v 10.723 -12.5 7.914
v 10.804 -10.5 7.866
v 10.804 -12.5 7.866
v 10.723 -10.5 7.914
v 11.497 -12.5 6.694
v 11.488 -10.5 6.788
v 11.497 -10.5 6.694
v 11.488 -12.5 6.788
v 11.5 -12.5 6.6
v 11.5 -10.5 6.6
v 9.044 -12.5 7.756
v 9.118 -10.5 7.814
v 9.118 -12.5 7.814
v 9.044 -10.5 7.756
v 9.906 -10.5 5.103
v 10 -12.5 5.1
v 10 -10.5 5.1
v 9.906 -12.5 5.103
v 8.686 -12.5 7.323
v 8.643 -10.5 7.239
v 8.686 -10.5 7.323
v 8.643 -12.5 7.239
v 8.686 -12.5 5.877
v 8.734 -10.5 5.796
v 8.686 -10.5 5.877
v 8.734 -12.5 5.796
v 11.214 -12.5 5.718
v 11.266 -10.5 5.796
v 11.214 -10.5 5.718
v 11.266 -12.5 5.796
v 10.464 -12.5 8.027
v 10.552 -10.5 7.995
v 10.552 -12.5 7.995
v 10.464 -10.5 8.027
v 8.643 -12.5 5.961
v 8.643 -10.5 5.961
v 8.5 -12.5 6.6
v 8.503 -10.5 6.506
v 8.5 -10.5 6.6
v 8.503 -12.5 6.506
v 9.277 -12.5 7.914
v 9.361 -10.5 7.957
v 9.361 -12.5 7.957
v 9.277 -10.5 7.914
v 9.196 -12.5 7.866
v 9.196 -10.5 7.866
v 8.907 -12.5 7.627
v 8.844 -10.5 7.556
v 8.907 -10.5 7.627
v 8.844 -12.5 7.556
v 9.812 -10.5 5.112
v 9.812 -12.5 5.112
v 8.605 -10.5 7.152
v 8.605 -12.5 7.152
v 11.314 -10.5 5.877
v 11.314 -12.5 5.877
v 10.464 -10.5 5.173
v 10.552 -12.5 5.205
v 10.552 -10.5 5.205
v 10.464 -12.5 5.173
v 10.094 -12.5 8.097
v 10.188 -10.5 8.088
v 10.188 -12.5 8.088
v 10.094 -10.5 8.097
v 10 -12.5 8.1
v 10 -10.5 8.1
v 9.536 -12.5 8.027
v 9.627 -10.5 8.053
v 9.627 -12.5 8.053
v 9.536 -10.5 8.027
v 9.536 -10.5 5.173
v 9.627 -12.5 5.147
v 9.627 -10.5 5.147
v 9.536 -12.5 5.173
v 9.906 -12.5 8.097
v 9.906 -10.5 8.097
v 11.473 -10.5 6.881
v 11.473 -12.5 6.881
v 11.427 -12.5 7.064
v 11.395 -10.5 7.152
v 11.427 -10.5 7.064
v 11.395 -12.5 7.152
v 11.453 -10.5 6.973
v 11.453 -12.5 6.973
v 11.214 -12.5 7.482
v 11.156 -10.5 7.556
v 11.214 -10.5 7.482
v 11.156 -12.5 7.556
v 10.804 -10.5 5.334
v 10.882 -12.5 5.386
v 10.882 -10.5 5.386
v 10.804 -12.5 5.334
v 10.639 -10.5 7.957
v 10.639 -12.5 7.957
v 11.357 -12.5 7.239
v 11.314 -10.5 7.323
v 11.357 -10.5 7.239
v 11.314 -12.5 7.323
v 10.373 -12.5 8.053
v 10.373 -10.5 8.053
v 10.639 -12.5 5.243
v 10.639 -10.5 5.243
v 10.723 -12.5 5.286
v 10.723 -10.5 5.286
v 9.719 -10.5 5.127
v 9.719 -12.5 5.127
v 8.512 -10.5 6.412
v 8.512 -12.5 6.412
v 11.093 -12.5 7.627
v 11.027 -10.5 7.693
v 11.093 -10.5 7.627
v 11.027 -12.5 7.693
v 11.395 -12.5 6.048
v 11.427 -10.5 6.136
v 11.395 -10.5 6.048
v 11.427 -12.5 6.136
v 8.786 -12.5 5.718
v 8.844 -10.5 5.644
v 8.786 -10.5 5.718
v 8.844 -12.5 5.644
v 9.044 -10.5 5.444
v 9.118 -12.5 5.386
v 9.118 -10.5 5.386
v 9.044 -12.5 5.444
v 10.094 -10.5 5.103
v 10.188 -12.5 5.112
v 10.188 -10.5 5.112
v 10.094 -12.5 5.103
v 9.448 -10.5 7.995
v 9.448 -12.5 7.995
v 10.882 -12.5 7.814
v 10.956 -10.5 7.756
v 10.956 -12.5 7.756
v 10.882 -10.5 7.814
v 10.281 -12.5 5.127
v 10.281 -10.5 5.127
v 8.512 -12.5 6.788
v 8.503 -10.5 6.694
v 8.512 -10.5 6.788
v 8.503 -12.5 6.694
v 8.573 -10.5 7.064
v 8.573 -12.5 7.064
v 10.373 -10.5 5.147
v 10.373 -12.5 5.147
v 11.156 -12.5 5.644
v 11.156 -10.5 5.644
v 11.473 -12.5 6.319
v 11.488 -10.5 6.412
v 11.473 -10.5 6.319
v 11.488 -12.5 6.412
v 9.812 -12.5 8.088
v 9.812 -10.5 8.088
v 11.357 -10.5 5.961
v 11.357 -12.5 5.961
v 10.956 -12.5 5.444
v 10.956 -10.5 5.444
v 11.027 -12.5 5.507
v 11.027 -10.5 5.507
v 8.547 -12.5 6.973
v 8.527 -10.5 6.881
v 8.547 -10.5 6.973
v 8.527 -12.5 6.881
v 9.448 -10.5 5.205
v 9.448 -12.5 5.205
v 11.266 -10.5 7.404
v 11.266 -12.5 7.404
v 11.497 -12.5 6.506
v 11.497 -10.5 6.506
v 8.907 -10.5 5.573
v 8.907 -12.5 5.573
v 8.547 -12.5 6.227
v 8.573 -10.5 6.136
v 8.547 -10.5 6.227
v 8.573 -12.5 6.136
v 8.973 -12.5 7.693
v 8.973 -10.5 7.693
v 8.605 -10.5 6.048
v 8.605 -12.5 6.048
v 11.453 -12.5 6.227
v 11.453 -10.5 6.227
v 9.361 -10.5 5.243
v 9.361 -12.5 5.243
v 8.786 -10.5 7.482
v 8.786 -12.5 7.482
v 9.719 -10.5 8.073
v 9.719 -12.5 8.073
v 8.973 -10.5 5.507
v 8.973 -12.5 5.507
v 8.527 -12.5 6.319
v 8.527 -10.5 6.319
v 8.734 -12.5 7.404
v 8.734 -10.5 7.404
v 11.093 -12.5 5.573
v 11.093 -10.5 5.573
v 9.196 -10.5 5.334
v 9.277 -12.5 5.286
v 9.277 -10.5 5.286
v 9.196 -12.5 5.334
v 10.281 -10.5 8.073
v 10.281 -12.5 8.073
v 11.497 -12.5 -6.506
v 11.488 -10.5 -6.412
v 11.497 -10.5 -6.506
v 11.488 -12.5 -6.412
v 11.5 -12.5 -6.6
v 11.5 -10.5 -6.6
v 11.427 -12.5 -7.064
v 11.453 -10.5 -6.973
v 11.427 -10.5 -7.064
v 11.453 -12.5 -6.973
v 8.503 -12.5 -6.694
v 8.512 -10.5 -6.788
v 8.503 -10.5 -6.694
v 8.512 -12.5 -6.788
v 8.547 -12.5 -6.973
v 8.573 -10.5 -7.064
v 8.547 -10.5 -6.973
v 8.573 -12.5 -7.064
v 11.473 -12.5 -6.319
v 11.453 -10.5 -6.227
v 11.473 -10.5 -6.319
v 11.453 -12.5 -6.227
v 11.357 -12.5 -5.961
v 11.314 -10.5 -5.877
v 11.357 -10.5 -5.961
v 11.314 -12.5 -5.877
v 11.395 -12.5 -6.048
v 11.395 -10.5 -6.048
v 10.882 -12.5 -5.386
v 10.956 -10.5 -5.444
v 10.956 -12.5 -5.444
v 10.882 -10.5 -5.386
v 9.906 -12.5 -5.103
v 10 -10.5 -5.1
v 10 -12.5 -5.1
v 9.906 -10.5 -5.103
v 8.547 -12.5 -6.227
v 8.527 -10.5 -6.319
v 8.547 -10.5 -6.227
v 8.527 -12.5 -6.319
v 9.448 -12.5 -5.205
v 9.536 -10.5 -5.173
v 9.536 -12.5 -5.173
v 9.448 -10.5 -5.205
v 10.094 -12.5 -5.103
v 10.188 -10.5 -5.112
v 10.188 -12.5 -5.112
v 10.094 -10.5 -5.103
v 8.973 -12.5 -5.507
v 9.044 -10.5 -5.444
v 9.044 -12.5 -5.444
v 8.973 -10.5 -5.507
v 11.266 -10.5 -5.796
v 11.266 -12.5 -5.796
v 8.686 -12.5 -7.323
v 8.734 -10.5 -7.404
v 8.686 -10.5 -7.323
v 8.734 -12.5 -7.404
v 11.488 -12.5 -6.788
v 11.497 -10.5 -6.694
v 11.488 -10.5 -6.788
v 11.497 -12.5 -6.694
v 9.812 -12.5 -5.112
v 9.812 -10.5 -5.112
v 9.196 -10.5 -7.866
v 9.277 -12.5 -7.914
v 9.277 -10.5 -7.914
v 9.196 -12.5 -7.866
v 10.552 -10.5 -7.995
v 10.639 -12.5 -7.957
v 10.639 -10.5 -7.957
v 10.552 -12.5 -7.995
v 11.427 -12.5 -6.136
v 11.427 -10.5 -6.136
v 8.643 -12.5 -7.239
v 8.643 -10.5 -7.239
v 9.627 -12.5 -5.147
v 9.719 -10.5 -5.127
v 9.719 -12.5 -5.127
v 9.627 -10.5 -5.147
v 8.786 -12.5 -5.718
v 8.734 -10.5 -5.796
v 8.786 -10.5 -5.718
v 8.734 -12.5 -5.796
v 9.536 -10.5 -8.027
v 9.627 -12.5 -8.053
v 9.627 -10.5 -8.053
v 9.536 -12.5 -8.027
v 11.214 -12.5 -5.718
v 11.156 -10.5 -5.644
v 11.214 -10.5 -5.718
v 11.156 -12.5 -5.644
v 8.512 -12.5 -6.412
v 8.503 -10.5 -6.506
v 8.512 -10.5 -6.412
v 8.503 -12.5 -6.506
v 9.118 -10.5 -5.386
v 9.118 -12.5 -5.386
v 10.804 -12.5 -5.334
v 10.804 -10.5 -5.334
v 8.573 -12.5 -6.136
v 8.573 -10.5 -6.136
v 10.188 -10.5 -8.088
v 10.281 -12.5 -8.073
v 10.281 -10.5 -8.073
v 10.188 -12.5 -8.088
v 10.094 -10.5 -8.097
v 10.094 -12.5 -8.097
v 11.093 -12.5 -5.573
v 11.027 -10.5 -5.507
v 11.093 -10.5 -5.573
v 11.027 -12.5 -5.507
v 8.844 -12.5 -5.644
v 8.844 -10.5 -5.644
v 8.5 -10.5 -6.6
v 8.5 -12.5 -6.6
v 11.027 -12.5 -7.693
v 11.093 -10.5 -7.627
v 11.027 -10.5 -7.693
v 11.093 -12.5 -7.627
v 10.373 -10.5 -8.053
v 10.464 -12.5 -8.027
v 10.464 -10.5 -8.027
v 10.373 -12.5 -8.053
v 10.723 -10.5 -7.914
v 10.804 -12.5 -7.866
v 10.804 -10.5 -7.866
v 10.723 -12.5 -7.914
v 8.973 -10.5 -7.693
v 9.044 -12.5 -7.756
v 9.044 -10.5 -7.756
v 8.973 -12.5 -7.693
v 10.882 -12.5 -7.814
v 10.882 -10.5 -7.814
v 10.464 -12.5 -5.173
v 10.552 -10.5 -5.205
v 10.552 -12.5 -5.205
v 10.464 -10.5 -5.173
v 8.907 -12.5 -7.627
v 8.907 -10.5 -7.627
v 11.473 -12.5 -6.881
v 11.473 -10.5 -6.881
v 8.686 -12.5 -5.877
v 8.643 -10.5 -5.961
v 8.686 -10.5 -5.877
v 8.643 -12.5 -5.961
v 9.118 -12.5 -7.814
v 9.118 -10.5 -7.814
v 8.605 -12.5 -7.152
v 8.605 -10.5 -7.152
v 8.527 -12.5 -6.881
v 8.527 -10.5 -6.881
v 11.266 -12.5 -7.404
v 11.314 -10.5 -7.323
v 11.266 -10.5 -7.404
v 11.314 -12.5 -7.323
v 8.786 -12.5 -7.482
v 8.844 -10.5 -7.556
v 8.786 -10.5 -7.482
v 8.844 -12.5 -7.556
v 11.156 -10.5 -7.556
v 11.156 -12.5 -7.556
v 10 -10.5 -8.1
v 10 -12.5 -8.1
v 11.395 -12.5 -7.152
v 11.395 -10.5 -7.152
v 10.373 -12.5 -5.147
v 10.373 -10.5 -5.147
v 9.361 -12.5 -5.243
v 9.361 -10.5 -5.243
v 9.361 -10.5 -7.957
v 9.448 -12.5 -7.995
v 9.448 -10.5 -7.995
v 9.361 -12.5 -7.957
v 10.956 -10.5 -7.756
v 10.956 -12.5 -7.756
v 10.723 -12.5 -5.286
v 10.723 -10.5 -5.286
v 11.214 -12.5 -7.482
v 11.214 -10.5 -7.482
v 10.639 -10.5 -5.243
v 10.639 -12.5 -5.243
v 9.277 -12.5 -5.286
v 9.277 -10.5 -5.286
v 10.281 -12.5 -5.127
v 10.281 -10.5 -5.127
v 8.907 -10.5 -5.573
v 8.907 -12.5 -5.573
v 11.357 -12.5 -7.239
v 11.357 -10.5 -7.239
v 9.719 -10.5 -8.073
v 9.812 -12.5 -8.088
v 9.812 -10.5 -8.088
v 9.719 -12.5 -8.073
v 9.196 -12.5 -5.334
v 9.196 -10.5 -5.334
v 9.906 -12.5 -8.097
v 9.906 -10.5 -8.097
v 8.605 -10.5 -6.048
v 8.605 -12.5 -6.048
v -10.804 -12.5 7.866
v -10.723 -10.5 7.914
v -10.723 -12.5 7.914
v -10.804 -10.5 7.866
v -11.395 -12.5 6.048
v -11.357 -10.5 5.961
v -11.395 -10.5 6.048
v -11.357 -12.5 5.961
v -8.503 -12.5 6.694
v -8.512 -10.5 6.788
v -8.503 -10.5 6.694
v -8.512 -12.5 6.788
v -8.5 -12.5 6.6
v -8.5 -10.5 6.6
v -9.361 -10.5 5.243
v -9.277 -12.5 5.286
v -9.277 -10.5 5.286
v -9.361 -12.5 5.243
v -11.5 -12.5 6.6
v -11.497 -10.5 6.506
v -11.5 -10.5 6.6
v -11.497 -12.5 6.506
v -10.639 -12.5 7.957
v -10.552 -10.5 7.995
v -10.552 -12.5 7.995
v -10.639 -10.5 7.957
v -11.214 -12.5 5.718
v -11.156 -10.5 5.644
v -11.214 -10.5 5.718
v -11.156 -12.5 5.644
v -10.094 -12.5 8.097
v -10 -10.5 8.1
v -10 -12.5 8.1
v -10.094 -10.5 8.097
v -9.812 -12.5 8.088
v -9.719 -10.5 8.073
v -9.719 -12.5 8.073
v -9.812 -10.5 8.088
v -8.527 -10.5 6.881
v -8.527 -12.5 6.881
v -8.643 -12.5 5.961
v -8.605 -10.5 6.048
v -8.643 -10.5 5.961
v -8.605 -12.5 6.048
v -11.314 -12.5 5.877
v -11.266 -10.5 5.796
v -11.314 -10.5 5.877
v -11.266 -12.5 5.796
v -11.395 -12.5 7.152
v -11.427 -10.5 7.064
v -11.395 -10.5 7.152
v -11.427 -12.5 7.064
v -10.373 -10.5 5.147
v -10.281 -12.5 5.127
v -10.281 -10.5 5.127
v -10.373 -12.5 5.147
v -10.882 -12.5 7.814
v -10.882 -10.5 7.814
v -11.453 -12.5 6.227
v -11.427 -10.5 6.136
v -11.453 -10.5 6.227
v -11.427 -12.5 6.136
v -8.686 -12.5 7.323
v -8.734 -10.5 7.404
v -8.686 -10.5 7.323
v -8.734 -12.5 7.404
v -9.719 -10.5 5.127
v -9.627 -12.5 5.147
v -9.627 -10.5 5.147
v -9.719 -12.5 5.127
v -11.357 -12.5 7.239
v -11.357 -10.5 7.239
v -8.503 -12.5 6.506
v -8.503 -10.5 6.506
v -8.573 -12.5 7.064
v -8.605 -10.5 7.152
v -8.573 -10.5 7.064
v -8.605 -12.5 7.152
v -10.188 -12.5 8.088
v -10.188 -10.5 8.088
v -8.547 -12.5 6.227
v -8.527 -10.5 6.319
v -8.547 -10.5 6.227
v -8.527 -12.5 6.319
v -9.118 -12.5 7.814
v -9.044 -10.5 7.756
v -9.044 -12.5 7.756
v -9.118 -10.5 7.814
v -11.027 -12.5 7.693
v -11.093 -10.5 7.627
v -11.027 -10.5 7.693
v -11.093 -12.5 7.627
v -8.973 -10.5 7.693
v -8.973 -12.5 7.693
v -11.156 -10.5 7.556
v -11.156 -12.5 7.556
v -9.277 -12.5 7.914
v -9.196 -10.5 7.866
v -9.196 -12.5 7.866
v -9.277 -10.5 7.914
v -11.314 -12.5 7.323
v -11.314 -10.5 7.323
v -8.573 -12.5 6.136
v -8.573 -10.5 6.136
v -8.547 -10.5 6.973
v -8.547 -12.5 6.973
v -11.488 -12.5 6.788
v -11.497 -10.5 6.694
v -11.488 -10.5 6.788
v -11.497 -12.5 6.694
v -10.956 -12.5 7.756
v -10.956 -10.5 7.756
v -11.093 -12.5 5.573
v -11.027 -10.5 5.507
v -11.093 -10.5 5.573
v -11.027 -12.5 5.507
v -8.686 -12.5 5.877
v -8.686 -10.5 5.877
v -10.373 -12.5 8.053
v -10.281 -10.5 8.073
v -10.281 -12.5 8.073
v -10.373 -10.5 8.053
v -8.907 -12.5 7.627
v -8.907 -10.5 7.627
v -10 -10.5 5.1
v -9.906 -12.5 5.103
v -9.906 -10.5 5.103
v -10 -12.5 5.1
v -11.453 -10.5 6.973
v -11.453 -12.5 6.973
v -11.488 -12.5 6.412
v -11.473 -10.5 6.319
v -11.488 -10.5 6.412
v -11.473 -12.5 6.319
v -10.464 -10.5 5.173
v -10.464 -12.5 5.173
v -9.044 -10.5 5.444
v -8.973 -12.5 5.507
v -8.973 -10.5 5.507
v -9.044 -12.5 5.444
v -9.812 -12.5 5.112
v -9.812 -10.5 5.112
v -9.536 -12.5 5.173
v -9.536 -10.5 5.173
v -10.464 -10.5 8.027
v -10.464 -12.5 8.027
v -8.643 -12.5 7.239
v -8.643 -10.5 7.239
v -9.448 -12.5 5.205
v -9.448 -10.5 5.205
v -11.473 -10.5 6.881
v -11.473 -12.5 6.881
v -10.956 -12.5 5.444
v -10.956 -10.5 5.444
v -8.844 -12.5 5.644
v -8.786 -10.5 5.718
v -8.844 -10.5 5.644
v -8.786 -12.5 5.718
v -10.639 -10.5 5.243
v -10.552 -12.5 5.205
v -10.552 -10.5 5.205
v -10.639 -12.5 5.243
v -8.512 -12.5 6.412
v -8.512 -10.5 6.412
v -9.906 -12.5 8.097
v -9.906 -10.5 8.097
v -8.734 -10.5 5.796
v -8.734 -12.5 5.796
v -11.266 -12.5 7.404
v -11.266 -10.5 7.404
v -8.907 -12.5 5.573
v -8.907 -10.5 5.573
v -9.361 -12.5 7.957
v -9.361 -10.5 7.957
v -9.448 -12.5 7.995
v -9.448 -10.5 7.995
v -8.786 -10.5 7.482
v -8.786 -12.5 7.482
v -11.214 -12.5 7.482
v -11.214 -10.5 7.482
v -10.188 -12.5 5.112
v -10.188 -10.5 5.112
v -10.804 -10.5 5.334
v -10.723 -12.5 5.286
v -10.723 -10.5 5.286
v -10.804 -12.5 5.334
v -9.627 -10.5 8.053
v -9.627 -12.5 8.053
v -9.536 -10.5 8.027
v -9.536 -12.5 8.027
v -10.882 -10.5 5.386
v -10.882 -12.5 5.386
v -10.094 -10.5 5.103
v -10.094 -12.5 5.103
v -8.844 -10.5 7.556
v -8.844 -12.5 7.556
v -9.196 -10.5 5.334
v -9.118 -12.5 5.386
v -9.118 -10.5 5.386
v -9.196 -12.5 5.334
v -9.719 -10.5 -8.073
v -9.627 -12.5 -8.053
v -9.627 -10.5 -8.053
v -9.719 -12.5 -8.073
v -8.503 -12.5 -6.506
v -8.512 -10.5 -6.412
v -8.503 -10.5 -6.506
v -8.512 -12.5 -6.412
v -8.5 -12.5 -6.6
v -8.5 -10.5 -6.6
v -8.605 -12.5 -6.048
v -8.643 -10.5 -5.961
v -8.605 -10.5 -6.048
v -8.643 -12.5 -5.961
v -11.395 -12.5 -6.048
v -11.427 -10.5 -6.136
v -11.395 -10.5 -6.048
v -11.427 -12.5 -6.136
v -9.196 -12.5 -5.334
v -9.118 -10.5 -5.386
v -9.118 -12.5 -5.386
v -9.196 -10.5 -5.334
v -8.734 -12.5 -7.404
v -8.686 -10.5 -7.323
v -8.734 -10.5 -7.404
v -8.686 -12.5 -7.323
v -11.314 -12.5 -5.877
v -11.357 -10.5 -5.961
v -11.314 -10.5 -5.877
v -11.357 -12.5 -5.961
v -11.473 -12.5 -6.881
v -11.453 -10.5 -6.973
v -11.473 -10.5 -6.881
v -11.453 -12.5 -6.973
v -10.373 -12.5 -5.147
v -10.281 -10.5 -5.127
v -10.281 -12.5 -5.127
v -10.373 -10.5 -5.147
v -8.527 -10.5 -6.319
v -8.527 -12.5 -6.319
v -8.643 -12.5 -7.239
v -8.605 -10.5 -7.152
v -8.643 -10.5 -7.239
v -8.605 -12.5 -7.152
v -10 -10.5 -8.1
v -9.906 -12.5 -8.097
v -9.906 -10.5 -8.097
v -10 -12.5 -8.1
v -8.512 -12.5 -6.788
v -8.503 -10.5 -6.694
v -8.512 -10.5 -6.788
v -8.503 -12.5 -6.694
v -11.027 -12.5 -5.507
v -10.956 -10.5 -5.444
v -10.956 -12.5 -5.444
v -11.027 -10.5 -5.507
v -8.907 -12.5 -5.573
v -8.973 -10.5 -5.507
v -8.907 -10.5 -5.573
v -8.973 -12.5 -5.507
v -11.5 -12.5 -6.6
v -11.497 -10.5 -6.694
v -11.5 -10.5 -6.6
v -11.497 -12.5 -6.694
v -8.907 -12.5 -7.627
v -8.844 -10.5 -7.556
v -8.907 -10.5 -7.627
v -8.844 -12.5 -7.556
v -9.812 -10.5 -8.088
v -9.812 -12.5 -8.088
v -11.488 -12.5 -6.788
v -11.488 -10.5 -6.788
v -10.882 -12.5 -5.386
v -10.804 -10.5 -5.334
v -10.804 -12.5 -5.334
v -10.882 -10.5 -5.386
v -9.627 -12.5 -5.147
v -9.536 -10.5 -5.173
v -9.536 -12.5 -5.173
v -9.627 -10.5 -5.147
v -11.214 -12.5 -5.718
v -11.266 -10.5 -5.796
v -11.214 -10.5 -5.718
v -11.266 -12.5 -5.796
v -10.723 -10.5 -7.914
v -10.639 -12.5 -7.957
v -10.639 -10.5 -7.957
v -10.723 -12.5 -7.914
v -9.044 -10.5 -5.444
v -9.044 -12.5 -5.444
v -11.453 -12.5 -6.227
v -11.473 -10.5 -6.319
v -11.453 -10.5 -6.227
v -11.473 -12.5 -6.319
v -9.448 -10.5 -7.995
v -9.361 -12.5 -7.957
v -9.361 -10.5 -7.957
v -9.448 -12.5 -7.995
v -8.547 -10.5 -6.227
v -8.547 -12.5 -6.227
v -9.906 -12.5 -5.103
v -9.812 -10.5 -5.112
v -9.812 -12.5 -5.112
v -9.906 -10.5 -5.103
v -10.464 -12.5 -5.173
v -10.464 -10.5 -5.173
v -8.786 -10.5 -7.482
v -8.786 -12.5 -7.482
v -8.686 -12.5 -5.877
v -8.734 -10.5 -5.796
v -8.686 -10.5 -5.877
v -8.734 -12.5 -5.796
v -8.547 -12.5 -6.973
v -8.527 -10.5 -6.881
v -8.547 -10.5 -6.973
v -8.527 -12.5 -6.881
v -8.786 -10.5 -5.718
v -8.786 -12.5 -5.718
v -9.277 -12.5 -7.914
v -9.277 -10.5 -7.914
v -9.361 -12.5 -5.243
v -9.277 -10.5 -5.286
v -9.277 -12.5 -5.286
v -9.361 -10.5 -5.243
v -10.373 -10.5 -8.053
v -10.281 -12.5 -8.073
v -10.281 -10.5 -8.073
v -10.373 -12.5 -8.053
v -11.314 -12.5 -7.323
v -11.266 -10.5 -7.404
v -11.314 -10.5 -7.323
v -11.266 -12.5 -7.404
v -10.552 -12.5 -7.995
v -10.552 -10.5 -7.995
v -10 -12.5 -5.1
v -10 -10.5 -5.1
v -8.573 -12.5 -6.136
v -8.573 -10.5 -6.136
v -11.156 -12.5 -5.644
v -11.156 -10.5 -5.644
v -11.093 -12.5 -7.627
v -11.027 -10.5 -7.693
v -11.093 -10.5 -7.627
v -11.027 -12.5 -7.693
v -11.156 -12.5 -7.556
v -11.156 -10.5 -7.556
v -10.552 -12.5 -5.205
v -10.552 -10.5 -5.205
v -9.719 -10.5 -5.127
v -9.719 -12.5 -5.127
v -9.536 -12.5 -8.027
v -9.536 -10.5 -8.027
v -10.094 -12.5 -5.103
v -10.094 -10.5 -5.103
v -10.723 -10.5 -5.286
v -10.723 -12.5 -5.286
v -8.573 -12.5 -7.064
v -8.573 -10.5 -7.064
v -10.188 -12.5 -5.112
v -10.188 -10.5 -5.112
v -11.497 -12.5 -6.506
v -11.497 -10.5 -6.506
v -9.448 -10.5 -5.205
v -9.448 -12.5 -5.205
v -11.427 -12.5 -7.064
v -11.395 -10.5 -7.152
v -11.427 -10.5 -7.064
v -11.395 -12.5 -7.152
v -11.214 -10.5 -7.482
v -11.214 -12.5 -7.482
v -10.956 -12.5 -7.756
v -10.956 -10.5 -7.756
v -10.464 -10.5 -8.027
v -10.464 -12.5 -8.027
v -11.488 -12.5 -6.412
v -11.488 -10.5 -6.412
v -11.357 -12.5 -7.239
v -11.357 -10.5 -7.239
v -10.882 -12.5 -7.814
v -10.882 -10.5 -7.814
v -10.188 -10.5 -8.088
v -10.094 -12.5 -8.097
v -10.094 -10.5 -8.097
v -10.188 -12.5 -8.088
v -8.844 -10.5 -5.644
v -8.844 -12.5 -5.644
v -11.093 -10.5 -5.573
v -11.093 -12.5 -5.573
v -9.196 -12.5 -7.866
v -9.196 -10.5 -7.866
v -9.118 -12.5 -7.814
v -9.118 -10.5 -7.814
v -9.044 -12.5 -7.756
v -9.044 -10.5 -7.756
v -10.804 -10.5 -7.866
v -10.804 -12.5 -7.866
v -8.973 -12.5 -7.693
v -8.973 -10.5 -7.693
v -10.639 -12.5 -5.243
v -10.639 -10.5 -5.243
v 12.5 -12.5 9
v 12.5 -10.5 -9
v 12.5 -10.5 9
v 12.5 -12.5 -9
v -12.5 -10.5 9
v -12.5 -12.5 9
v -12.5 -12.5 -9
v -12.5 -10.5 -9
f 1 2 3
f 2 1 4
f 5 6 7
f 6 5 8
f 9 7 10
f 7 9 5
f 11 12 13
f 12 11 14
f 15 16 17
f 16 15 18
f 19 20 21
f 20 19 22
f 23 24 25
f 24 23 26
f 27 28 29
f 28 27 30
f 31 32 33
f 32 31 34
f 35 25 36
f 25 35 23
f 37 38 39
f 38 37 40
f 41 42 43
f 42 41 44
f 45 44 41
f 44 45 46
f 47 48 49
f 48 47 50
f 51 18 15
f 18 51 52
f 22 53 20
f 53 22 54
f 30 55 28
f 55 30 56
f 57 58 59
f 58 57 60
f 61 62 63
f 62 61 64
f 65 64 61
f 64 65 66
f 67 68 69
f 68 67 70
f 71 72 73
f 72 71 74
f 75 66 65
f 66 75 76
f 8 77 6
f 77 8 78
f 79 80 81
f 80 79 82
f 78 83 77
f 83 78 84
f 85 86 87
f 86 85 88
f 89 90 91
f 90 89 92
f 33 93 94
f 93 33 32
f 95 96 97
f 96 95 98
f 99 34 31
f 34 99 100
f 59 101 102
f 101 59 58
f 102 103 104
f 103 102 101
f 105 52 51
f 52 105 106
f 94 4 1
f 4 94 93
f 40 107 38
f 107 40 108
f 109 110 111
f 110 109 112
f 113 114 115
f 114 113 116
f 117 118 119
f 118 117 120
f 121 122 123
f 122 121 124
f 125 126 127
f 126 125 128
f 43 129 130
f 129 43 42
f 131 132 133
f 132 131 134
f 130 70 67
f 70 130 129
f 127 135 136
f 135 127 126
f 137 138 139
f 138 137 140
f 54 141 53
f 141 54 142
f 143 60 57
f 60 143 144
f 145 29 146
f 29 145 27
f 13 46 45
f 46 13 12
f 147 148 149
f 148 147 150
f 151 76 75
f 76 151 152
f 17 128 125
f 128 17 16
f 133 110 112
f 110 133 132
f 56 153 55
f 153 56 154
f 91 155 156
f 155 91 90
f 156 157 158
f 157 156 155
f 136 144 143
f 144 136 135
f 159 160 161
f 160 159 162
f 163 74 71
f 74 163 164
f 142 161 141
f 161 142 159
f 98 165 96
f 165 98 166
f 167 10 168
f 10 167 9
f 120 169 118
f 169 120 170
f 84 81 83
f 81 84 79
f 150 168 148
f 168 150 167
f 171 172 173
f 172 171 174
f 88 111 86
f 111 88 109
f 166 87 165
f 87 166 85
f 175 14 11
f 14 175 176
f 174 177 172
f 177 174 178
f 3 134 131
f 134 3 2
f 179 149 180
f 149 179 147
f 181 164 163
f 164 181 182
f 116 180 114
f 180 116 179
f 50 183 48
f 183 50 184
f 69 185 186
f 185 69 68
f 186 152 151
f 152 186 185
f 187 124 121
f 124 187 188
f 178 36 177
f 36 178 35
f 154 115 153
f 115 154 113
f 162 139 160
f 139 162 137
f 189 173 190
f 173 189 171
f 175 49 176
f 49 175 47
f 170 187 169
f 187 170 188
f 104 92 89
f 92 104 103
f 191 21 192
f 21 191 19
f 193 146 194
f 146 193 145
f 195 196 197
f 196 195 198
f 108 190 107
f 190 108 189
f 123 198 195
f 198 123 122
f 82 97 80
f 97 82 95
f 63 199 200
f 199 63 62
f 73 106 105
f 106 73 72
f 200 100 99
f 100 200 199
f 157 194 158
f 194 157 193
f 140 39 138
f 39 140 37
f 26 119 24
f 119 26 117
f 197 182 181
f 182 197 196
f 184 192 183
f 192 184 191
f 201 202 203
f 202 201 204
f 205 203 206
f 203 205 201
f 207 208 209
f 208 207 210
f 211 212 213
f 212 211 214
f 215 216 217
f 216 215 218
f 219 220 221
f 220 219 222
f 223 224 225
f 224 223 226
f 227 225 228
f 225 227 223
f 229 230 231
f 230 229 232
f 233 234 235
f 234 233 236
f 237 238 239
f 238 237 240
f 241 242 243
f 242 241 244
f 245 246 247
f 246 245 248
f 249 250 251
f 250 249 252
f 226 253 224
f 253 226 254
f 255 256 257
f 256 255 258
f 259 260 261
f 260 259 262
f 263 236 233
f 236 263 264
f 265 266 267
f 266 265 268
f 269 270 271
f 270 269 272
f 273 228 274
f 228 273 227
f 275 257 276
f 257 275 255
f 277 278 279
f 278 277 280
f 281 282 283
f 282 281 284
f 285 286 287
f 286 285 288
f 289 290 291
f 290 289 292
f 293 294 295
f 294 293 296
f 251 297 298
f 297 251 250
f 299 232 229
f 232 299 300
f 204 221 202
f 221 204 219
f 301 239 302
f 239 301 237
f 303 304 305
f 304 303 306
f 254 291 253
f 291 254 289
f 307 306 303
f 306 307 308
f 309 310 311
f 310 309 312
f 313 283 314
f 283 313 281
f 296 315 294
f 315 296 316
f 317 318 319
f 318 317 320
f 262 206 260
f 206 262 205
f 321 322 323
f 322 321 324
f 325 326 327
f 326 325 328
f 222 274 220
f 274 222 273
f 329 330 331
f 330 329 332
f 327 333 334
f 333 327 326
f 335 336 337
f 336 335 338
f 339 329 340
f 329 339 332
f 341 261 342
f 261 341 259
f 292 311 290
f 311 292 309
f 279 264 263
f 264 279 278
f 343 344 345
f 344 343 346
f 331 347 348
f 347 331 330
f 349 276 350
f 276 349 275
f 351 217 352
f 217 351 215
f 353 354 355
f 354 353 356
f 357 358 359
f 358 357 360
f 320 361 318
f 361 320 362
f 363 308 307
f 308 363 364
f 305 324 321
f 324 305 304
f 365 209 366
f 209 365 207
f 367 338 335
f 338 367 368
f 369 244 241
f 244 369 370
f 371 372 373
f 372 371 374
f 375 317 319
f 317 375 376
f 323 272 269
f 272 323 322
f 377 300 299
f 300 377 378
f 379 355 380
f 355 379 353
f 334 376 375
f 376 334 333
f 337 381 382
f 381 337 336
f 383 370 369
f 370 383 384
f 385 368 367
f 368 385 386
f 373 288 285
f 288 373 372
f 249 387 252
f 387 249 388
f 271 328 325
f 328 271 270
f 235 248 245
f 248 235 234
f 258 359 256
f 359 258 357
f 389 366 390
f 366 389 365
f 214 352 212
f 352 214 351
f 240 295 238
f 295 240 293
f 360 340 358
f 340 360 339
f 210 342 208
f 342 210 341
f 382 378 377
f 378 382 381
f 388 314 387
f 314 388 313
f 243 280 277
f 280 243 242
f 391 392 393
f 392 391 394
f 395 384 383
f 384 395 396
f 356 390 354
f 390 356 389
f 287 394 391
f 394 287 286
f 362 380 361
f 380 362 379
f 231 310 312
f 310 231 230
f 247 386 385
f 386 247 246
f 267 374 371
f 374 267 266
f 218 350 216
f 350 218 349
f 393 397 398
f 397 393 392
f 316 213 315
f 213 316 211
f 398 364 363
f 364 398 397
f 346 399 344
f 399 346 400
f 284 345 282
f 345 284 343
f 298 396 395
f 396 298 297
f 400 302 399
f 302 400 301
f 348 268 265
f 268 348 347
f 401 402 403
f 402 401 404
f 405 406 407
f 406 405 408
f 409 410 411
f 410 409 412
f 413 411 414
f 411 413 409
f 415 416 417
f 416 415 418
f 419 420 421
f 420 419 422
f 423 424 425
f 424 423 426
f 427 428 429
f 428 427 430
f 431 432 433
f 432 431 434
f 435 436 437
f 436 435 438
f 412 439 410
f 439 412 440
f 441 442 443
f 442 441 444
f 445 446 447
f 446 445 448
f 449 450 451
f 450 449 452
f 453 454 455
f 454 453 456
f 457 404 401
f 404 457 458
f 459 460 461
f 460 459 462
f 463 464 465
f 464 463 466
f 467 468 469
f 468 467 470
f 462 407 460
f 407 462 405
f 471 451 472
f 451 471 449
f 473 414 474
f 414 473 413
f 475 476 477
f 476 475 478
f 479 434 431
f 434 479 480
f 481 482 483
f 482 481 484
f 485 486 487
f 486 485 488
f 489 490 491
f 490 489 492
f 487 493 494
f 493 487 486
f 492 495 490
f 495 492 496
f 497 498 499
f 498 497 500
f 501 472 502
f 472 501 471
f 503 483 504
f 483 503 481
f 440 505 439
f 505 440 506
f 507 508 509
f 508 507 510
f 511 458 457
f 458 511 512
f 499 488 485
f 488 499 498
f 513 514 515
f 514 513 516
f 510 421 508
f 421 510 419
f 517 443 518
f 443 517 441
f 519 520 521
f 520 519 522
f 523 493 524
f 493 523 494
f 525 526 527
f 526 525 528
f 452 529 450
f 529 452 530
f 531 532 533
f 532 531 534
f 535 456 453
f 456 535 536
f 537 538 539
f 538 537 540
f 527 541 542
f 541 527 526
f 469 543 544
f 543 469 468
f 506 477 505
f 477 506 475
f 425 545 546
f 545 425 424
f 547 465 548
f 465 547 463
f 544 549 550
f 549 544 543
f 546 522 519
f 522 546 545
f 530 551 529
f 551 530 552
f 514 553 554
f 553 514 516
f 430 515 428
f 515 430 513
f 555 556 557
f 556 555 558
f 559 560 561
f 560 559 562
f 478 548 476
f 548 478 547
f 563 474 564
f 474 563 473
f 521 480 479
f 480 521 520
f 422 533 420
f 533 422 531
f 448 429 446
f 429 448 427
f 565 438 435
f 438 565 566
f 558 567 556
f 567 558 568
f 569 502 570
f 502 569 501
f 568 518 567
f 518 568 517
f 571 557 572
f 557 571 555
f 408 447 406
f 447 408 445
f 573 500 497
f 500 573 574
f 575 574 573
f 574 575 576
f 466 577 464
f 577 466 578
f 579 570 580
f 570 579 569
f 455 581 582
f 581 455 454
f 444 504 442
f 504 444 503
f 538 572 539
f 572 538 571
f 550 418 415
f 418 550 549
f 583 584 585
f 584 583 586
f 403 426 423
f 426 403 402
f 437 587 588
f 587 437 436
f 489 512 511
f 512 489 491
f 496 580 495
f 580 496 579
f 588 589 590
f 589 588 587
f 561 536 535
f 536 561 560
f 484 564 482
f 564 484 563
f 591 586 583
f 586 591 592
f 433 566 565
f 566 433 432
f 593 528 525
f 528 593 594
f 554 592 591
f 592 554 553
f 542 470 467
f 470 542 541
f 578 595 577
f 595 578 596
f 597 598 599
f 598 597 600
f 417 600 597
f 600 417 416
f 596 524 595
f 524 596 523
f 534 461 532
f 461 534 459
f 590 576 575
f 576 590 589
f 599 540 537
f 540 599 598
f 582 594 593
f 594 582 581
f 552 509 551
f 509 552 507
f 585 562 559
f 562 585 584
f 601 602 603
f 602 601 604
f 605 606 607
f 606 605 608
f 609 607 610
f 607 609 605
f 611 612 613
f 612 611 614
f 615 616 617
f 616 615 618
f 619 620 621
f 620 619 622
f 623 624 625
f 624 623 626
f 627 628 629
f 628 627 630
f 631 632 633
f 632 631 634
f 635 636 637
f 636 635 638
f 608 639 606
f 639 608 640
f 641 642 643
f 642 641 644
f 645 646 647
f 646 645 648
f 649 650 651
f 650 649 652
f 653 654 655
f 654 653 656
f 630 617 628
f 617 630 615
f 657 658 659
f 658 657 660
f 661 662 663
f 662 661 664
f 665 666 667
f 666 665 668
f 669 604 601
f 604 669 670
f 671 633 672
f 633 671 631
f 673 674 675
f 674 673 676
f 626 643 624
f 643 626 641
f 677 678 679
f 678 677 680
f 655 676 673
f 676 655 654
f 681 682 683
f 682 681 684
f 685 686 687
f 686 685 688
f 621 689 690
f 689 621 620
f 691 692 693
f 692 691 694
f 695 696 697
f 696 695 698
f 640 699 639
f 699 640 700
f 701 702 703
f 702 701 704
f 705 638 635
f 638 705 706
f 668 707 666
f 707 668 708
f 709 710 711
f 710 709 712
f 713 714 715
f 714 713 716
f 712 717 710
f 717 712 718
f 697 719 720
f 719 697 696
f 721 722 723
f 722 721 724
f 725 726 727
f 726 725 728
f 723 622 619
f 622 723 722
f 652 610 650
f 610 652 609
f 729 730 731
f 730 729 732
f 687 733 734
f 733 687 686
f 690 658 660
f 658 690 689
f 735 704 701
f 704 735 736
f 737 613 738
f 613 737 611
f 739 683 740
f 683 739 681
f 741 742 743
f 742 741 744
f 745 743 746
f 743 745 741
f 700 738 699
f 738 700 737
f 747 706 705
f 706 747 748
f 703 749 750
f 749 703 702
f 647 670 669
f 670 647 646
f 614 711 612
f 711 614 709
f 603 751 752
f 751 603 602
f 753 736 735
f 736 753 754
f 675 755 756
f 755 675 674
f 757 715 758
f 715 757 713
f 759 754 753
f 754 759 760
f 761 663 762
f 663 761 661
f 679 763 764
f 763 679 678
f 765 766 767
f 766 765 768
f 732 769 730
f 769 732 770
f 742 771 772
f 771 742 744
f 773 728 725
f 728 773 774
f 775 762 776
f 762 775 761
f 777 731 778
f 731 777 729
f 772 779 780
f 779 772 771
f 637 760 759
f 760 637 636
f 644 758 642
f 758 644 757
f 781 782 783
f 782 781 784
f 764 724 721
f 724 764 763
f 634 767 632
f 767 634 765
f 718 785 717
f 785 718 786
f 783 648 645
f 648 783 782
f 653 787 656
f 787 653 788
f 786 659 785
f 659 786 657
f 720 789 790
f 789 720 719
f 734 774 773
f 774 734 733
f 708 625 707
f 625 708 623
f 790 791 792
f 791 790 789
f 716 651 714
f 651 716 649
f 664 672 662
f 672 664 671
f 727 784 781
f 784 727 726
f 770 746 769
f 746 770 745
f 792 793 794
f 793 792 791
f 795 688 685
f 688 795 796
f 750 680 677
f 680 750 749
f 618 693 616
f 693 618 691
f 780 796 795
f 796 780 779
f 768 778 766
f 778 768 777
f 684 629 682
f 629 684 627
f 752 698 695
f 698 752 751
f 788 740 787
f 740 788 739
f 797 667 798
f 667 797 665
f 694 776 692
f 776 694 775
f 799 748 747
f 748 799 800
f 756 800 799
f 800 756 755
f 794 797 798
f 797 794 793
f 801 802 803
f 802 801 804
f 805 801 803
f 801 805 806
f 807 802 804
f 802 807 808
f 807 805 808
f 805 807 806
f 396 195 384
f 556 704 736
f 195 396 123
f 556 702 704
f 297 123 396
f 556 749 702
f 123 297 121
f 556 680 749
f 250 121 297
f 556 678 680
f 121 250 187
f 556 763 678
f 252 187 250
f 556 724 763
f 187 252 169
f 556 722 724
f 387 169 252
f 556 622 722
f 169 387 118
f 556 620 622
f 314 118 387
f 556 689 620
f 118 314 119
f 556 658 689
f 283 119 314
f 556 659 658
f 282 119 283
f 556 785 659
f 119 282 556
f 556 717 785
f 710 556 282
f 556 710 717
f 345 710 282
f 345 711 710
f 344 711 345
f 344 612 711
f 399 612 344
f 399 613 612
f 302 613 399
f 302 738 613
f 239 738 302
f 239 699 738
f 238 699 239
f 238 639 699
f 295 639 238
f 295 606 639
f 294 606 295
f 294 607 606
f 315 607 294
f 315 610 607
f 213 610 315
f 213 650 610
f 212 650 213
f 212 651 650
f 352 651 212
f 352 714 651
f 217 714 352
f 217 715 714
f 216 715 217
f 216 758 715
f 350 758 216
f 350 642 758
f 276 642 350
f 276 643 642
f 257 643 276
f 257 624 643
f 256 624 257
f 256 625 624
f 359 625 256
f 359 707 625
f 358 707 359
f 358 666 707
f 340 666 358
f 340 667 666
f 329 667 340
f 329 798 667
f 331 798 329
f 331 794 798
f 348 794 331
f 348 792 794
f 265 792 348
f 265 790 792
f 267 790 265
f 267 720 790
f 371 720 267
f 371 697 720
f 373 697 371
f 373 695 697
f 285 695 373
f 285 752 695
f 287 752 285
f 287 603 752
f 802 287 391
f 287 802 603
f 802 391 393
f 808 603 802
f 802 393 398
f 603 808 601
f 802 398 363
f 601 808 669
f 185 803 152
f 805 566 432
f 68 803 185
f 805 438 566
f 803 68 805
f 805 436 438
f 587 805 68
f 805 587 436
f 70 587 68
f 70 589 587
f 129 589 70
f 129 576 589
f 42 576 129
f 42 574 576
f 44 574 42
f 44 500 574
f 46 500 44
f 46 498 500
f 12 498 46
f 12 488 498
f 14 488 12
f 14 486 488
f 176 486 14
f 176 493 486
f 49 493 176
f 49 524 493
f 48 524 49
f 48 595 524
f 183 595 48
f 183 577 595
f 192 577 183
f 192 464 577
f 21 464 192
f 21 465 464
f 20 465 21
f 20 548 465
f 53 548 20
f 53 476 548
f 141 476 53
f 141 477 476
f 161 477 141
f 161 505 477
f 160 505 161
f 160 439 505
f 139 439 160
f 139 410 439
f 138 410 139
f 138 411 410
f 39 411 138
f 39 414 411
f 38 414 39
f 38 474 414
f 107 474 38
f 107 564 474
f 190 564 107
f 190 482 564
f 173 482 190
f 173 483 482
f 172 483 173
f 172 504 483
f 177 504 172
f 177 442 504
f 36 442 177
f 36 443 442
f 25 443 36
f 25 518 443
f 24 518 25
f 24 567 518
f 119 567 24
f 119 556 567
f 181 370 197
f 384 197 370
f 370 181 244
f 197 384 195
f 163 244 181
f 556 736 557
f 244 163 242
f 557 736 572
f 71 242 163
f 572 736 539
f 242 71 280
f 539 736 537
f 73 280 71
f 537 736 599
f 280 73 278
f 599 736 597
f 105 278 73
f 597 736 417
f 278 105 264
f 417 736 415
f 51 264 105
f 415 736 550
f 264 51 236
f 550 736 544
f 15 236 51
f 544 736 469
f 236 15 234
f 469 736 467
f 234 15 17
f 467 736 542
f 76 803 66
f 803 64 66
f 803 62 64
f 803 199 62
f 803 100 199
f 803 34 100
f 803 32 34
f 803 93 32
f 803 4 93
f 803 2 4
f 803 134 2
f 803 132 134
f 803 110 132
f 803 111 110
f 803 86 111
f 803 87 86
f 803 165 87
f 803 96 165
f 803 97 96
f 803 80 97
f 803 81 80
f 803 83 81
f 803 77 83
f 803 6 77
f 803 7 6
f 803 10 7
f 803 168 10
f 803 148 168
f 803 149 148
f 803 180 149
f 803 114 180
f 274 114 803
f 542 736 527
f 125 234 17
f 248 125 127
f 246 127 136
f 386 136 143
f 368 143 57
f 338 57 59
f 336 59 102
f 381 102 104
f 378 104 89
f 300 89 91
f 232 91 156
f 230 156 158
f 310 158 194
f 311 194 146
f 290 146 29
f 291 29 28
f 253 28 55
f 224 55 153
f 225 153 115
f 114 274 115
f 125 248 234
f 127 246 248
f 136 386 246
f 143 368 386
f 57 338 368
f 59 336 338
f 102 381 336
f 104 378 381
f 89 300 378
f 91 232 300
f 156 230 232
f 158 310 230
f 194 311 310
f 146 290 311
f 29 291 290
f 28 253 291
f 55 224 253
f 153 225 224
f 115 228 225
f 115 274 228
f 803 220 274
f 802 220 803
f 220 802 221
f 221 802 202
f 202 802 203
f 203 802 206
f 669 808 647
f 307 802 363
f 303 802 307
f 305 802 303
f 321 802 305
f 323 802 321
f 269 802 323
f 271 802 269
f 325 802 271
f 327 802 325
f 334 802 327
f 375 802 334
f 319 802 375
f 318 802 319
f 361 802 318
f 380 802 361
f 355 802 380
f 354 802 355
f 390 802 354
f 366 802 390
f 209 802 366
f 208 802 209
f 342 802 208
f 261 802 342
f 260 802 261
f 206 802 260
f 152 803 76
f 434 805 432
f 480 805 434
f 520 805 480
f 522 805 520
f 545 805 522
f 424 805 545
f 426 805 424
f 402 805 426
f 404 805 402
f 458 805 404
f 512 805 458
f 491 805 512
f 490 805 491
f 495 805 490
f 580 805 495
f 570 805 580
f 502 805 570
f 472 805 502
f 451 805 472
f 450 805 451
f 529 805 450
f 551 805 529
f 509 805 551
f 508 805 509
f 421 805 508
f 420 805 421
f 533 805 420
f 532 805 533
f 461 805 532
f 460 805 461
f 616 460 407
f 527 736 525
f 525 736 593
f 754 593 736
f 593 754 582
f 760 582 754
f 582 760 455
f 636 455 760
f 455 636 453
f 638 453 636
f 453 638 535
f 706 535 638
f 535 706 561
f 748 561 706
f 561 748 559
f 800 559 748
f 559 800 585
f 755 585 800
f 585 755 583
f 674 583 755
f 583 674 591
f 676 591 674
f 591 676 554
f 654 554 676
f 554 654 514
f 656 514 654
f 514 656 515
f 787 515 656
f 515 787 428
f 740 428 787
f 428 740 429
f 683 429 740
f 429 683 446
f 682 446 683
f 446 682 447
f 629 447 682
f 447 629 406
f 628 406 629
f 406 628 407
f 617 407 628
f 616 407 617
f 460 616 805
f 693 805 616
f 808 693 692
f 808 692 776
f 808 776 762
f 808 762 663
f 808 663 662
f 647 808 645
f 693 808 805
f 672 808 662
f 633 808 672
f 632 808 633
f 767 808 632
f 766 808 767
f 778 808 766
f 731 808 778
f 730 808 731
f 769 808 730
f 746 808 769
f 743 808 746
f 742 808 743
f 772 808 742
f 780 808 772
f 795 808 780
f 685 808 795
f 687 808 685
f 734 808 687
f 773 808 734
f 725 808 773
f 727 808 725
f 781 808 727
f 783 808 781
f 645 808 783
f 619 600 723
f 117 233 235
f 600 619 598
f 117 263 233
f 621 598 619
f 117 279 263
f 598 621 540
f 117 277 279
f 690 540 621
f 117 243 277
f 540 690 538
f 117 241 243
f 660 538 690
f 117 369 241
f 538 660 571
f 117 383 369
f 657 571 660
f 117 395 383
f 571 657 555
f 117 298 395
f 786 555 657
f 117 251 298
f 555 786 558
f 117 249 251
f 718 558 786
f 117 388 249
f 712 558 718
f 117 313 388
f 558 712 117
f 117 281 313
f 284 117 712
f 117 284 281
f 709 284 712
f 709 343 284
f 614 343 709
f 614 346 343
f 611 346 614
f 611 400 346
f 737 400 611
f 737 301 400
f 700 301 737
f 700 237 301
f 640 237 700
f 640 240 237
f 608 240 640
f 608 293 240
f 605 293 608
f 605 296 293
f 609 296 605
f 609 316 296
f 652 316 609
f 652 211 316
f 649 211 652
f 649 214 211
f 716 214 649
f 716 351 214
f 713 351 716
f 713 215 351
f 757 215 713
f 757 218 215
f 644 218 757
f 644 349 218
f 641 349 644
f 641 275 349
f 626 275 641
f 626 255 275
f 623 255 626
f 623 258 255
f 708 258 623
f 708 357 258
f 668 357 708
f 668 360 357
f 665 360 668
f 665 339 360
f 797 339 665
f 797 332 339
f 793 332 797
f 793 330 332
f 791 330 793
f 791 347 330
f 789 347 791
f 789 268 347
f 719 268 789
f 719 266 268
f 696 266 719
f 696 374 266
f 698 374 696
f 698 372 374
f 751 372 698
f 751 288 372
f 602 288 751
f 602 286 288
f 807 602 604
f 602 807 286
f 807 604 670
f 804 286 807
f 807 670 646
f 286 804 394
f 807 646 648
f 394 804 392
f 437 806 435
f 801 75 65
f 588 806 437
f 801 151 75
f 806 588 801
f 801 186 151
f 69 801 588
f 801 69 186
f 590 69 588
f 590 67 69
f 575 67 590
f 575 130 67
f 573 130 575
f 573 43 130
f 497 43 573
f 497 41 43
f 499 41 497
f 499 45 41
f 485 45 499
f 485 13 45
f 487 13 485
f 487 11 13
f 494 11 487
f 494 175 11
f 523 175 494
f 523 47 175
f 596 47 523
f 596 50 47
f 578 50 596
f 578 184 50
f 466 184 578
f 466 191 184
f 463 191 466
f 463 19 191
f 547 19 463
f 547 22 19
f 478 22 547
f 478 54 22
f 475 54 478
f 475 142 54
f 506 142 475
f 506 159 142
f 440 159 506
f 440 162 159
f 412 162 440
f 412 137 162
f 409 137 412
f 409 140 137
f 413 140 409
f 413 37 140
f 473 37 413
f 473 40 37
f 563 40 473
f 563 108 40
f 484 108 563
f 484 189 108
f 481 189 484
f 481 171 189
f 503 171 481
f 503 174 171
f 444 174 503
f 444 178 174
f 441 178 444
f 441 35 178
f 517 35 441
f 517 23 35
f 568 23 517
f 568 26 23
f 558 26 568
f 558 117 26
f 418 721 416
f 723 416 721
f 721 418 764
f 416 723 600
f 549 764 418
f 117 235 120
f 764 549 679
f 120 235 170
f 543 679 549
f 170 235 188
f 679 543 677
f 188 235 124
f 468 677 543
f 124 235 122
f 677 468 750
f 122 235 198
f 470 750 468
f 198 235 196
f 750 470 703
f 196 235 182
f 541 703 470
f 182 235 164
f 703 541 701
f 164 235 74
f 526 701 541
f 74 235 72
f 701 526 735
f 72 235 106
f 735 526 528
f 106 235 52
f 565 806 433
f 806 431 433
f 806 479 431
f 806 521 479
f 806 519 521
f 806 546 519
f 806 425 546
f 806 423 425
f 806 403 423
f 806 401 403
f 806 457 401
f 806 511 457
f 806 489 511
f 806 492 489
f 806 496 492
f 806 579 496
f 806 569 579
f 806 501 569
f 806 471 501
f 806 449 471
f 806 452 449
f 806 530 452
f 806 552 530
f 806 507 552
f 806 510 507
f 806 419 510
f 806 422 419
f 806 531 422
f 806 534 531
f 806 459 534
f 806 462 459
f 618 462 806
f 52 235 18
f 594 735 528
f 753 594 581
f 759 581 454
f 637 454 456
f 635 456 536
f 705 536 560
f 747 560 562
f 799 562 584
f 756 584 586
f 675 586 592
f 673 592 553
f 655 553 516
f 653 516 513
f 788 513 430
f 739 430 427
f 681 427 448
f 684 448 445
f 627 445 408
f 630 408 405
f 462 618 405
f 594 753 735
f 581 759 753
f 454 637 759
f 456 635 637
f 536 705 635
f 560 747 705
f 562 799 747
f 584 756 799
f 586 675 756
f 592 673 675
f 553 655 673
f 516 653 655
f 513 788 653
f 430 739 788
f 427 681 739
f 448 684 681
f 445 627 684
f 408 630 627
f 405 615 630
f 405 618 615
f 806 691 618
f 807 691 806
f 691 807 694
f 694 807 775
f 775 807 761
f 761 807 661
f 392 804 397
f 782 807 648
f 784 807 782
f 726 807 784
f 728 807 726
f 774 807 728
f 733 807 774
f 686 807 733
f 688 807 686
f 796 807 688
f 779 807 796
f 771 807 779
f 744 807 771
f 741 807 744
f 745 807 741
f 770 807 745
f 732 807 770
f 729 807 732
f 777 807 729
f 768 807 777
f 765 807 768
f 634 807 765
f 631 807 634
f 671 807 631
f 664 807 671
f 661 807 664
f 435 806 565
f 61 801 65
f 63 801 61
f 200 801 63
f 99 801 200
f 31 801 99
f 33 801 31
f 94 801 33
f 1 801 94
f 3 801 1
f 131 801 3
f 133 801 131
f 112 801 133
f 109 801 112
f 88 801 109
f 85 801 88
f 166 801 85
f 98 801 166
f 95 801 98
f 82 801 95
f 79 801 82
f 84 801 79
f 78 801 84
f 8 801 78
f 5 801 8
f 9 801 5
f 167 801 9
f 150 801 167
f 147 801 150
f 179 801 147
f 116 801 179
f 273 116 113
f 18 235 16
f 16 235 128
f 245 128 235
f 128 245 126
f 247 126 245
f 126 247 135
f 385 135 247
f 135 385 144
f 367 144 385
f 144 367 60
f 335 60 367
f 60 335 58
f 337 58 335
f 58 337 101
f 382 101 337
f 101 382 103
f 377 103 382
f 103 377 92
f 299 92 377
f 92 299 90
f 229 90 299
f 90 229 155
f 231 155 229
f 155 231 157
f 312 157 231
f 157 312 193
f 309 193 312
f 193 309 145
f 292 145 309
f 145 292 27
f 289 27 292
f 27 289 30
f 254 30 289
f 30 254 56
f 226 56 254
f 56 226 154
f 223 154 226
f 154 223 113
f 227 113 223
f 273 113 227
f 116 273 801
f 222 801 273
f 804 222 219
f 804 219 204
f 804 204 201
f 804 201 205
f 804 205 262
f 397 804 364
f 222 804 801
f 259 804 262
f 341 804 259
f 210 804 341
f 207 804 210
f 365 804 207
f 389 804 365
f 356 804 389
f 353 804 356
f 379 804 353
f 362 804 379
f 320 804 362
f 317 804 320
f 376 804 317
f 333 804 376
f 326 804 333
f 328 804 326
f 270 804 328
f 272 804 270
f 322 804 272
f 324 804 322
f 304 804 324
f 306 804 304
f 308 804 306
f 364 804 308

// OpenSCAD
difference(){
	union(){
        translate([-12.5,-12.5,-9]){
           cube([25,2,18], center=false);
        }

	}
	union() {
        translate([10,20,6.6]){
            rotate([90,0,0]){
                color("blue")
                cylinder(h=100, r=1.5, $fn=100, center=false);
            }
        }
        translate([10,20,-6.6]){
            rotate([90,0,0]){
                color("blue")
                cylinder(h=100, r=1.5, $fn=100, center=false);
            }
        }
        translate([-10,20,6.6]){
            rotate([90,0,0]){
                color("blue")
                cylinder(h=100, r=1.5, $fn=100, center=false);
            }
        }
        translate([-10,20,-6.6]){
            rotate([90,0,0]){
                color("blue")
                cylinder(h=100, r=1.5, $fn=100, center=false);
            }
        }

	}
}
